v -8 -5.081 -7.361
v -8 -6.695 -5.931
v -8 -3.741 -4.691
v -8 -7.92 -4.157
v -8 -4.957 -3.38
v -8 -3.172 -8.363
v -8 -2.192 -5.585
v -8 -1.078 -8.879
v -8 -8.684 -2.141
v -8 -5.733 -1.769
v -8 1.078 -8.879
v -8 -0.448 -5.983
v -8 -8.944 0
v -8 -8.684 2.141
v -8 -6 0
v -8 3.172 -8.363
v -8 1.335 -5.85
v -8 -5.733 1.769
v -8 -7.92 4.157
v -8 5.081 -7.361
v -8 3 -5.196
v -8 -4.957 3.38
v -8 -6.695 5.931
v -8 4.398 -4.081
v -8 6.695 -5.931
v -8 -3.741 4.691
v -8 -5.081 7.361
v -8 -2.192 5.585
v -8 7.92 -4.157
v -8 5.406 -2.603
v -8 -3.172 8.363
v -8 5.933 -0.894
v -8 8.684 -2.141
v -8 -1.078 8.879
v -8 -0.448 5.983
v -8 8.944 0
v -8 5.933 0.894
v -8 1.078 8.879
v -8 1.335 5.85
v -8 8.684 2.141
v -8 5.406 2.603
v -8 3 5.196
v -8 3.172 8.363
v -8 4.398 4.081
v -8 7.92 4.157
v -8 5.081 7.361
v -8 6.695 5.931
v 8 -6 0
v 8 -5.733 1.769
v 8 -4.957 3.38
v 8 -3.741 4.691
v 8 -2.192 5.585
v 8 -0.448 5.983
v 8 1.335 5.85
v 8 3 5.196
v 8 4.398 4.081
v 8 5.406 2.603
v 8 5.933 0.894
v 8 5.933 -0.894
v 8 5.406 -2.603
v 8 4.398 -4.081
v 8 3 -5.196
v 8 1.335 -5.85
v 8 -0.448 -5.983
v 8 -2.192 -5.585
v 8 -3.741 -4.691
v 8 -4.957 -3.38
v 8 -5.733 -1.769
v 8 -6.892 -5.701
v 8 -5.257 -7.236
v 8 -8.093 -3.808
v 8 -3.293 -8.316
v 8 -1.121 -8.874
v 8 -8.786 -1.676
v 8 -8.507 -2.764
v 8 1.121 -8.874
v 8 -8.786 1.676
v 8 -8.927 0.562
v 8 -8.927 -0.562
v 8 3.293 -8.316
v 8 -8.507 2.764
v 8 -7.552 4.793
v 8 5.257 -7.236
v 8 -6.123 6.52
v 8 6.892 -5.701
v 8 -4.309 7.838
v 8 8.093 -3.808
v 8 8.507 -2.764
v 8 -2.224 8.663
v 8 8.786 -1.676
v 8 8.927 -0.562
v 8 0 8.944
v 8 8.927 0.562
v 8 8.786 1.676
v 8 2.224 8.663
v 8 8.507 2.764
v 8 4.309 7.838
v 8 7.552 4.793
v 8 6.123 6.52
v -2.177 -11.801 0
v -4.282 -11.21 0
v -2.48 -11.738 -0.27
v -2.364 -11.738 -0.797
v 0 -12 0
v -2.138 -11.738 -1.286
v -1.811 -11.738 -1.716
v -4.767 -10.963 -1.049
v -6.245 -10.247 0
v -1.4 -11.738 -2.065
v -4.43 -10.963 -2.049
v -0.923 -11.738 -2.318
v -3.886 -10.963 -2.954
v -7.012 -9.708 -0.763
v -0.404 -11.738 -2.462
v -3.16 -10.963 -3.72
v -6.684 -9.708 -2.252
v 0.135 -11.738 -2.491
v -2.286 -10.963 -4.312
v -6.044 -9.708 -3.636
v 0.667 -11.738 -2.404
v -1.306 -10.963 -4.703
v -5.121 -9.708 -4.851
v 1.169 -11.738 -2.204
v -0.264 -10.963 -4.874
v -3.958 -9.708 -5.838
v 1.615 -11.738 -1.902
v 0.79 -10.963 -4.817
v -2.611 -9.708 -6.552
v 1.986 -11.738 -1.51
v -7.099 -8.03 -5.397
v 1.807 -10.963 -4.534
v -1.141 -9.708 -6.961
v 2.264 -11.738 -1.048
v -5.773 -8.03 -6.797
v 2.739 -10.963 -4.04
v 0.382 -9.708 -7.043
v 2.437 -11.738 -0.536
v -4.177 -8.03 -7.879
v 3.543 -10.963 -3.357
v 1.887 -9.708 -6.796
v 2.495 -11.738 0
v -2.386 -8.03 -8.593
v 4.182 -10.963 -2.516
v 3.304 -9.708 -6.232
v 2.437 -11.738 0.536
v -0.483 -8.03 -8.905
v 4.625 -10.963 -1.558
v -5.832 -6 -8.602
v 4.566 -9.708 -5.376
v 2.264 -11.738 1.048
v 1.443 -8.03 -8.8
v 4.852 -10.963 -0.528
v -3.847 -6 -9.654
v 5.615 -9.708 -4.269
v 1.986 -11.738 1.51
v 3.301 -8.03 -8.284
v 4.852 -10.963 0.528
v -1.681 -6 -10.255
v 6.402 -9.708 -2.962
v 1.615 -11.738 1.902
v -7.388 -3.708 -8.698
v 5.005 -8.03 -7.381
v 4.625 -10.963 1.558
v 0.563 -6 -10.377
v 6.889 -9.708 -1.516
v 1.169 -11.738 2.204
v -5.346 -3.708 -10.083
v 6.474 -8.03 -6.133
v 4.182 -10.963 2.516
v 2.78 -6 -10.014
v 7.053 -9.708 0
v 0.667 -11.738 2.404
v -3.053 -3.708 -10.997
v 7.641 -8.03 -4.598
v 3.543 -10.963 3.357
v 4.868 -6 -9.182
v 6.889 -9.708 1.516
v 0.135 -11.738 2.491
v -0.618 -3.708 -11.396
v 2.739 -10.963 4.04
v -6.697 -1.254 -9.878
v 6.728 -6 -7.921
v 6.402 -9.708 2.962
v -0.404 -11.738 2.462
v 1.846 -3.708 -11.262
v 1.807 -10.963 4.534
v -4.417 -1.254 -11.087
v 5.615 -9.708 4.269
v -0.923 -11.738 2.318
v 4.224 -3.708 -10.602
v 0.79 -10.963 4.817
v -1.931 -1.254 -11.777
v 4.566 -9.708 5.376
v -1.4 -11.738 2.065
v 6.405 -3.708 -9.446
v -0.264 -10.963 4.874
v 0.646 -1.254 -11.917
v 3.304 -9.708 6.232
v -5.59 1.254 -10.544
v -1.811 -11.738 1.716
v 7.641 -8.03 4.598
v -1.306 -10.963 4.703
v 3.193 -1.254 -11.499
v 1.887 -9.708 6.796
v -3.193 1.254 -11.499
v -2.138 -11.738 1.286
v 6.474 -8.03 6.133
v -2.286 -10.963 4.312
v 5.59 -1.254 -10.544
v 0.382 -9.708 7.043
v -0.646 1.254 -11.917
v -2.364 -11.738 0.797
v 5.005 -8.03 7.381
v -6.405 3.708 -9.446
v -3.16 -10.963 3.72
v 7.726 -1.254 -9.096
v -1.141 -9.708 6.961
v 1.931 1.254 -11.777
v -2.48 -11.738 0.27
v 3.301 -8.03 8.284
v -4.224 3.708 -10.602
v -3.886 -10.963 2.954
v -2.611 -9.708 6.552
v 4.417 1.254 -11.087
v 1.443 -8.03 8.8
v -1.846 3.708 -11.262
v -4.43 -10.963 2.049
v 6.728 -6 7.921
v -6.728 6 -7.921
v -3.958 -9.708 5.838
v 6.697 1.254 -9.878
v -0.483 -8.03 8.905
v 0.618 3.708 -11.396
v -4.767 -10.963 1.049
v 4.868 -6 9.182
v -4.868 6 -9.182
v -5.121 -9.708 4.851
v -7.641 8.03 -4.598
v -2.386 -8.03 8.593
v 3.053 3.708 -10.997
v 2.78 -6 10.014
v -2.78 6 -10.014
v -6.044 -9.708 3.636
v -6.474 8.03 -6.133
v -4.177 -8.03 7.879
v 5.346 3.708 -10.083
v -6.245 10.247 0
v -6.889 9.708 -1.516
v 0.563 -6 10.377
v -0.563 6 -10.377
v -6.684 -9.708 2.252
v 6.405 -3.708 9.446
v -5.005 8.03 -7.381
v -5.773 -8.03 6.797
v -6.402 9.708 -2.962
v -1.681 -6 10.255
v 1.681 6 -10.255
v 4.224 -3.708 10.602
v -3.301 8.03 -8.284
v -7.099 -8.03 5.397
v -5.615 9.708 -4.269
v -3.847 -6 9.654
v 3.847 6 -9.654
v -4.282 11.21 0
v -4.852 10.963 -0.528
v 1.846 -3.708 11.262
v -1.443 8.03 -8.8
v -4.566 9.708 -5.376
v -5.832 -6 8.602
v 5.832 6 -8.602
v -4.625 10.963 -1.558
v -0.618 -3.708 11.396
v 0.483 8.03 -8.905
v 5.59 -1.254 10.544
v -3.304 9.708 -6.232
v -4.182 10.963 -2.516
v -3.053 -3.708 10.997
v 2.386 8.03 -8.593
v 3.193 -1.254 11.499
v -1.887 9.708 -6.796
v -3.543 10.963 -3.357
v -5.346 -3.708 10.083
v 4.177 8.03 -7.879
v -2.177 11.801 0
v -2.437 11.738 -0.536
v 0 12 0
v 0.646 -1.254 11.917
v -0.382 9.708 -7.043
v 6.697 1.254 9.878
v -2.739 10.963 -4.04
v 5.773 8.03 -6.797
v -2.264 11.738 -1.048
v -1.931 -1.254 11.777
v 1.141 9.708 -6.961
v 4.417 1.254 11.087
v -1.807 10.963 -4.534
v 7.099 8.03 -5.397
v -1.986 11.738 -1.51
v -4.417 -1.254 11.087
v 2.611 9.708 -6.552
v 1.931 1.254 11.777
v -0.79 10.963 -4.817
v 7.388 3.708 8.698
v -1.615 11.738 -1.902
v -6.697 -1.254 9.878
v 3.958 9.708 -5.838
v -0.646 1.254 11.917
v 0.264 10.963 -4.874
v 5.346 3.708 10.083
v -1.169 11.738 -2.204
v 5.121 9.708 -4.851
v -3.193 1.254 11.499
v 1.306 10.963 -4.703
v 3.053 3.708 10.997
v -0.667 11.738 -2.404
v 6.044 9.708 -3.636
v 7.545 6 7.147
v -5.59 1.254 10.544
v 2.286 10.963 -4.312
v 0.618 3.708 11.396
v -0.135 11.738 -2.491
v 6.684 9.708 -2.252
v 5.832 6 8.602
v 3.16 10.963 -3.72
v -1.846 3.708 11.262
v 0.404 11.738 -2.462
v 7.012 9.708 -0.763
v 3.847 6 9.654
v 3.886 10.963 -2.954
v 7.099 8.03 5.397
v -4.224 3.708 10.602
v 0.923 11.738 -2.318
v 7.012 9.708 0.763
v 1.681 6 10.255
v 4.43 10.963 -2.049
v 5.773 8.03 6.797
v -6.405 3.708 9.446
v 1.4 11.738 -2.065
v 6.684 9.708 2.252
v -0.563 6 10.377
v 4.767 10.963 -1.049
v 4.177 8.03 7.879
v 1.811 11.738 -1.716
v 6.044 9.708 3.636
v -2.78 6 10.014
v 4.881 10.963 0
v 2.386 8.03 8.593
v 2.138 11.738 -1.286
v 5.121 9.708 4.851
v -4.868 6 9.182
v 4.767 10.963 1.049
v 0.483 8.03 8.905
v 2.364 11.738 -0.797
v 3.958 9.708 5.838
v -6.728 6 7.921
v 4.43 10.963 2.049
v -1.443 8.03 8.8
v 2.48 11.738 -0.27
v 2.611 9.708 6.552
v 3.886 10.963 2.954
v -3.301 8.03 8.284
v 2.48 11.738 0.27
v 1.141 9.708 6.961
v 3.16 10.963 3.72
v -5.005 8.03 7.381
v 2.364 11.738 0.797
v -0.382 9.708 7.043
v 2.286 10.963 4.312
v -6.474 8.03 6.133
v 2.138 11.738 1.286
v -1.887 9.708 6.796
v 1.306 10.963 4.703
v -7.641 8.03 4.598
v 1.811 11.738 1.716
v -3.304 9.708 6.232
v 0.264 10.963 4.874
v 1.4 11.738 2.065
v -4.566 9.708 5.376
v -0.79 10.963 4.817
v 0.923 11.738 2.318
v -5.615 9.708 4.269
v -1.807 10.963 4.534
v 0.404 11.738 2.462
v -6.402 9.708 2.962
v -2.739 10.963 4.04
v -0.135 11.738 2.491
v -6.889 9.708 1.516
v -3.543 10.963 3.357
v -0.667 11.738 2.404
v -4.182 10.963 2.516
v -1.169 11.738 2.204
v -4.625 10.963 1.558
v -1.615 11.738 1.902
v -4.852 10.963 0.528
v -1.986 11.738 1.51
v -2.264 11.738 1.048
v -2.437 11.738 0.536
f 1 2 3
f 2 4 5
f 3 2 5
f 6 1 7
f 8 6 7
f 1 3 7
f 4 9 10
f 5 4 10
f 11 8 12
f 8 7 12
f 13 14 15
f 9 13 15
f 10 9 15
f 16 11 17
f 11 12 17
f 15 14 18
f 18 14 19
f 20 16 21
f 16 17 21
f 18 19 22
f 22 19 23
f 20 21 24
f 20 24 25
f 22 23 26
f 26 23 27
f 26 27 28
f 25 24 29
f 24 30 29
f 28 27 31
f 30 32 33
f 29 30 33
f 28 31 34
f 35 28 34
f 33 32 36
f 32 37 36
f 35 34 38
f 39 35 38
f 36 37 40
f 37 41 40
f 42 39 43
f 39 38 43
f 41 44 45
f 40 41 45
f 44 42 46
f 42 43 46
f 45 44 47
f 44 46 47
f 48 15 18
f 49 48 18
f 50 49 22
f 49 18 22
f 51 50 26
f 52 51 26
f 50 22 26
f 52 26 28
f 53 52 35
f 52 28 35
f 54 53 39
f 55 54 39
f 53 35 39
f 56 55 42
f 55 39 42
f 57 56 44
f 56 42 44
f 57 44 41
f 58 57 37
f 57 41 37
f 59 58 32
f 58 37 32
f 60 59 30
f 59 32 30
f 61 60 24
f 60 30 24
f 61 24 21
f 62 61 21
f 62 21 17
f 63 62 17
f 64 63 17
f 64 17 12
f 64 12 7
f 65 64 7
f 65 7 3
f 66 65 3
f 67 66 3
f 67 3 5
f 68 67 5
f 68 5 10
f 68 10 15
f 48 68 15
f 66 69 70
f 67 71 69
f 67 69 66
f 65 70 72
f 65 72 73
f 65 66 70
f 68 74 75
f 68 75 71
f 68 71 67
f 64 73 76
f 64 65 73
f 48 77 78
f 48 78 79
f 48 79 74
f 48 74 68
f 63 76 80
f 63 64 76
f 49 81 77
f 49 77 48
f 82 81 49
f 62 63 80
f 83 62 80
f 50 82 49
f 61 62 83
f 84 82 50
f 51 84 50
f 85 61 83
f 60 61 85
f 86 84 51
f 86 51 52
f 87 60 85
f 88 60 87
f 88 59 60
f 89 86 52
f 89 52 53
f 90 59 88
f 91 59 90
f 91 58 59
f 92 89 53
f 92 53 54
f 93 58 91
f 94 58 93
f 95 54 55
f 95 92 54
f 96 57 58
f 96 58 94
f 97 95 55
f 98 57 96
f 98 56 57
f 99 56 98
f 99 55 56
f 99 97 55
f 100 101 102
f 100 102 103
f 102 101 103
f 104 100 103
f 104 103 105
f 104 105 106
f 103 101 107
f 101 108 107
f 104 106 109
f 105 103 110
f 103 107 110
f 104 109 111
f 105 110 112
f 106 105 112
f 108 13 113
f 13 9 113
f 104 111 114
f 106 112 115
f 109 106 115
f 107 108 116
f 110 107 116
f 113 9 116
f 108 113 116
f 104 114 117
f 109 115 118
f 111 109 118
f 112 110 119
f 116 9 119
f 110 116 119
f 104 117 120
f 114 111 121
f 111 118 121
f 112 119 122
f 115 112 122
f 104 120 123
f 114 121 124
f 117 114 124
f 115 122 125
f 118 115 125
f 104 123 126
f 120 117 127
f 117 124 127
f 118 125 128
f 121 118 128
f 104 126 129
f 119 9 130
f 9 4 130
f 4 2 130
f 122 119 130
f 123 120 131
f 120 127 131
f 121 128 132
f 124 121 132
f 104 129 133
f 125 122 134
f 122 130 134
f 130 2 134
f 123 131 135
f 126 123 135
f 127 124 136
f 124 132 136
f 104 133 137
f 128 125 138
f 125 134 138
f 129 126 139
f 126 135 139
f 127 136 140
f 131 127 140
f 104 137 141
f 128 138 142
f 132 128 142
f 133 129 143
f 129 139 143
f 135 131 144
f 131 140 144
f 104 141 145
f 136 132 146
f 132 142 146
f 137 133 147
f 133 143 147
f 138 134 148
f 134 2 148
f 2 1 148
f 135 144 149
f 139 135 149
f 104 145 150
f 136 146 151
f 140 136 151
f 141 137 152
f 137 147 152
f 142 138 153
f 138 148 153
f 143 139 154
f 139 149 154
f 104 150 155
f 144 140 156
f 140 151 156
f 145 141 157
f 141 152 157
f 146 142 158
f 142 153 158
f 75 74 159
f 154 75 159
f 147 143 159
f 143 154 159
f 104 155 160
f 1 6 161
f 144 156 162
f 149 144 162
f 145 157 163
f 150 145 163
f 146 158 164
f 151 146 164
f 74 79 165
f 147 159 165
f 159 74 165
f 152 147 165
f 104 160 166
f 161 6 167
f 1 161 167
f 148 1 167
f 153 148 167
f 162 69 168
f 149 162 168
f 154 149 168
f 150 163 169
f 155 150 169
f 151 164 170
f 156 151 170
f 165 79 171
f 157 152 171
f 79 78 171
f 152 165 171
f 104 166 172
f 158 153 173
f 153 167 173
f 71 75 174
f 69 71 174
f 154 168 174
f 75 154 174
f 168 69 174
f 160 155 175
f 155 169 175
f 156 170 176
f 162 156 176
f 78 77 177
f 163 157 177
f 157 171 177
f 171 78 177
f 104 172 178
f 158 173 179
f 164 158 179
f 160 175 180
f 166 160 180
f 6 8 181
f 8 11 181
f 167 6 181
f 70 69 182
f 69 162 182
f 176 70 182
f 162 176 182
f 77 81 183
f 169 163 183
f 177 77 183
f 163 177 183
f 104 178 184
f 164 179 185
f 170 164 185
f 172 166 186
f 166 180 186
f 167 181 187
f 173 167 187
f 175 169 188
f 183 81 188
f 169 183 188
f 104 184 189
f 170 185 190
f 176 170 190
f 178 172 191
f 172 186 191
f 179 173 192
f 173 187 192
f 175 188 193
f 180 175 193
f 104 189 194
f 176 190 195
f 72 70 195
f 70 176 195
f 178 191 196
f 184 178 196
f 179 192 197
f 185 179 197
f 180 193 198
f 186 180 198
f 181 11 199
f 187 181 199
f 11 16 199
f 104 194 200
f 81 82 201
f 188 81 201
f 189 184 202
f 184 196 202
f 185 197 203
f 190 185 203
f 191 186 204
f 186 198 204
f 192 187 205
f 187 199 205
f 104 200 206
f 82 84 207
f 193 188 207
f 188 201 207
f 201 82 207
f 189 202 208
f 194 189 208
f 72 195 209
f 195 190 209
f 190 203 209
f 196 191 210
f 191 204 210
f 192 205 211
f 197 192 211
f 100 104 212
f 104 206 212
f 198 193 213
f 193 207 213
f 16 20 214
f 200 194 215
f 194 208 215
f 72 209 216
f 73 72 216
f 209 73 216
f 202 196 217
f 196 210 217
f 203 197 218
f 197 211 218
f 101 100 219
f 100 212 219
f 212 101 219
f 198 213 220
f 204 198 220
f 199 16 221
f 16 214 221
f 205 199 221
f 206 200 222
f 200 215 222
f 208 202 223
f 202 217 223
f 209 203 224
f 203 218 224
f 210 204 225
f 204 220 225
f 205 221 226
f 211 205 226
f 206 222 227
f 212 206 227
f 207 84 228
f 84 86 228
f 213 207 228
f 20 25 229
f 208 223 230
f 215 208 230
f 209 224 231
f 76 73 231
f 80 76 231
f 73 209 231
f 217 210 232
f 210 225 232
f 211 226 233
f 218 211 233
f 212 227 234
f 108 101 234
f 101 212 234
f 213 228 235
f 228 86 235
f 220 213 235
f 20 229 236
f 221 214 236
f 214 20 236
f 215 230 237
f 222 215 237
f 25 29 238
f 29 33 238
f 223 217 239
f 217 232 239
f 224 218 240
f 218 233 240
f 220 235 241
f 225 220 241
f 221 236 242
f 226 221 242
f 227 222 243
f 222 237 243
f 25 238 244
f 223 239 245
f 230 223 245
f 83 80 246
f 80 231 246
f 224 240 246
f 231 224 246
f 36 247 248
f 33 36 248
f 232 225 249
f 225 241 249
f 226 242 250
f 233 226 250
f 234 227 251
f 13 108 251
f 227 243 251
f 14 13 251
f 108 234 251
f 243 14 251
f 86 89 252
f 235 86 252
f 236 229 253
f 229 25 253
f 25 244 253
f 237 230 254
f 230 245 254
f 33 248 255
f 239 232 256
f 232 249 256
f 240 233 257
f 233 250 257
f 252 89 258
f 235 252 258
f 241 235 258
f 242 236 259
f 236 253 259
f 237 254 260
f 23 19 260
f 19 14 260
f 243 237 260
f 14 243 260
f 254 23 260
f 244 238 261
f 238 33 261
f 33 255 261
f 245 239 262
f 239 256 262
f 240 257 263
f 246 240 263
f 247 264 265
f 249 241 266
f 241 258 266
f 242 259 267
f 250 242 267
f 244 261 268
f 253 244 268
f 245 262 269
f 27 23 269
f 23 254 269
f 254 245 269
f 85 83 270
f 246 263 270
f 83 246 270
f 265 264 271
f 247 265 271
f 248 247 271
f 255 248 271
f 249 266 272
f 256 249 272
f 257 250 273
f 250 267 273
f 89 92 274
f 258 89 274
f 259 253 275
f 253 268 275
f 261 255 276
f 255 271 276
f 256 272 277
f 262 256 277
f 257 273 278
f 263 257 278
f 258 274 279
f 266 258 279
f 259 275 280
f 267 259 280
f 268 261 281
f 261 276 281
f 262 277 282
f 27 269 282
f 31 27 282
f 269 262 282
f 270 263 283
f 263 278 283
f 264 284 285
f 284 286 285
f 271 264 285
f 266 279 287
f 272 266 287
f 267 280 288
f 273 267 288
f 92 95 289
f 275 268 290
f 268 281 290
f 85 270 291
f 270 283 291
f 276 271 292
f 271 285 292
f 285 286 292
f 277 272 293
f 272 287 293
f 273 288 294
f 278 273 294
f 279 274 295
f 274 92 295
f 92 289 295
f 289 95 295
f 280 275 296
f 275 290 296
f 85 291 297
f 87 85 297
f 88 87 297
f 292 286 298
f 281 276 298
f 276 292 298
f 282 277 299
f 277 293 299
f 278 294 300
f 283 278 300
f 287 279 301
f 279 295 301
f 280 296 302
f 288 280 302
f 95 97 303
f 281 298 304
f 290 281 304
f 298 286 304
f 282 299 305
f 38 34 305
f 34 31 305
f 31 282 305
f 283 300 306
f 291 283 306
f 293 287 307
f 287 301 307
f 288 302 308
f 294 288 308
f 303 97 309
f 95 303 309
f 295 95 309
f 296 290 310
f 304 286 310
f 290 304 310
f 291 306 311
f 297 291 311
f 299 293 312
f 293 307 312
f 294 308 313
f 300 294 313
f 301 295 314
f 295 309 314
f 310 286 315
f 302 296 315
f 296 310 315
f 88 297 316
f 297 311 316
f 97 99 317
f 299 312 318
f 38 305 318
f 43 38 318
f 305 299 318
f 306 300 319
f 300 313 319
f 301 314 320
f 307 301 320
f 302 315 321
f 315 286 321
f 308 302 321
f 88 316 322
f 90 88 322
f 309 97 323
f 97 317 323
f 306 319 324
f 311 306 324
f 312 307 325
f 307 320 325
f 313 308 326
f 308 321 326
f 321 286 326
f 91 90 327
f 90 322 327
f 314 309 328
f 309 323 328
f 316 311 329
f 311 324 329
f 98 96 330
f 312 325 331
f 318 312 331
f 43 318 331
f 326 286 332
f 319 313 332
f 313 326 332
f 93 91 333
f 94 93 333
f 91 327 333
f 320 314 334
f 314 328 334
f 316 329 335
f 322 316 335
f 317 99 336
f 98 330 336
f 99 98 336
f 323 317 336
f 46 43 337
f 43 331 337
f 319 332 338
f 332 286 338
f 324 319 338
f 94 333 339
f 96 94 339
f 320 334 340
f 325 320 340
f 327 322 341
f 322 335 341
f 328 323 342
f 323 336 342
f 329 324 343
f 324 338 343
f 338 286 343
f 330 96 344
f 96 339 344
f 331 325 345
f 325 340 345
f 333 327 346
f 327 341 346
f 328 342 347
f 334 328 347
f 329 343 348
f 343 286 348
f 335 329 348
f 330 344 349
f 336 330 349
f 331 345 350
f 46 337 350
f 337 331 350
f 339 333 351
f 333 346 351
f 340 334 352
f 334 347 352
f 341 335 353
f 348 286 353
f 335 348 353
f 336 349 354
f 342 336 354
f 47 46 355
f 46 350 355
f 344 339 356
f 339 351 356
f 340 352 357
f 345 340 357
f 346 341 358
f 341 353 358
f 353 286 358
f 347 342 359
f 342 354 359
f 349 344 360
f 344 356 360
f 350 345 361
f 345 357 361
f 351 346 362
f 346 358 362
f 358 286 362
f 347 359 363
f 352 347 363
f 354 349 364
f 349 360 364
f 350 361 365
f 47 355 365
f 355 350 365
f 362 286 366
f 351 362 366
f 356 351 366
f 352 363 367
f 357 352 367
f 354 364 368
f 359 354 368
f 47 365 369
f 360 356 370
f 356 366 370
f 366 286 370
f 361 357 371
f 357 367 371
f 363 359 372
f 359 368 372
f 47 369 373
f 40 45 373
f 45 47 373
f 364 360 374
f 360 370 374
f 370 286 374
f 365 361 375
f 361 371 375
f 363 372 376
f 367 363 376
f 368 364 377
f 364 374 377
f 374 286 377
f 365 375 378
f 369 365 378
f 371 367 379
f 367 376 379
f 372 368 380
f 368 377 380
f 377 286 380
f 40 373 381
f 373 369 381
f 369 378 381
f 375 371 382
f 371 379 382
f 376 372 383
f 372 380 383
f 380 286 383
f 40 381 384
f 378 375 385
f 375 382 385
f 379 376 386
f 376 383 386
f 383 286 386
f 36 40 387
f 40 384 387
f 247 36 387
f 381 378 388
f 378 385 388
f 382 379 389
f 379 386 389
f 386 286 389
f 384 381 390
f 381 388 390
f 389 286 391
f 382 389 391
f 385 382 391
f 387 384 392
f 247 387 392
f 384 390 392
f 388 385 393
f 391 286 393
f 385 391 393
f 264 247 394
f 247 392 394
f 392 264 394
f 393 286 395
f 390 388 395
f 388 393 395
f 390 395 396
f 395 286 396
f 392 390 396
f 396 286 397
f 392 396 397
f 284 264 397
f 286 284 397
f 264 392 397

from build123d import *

# Parameters (mm, degrees)
SKETCH2_OUTSIDE_W   = 34.314
SKETCH2_OUTSIDE_H   = 34.314
SKETCH2_OUTSIDE_W_2 = 16
SKETCH2_OUTSIDE_H_2 = 32.405240589
CUT_EXTRUDE1_DEPTH  = 20
SKETCH3_R           = 6
CUT_EXTRUDE2_DEPTH  = 40


with BuildPart() as part:
    # Sketch1 → Revolve1 (revolve)
    with BuildSketch(Plane.XY):
        with BuildLine():
            Line((0, 12), (0, -12))
            ThreePointArc((0, -12), (-12, 0), (0, 12))
        make_face()
    revolve(axis=Axis((0, 16.812644527, 0), (0, -1, 0)))

    # Sketch2 outside → Cut-Extrude1 (cut, symmetric)
    with BuildSketch(Plane.XY):
        Rectangle(SKETCH2_OUTSIDE_W, SKETCH2_OUTSIDE_H)
        with Locations((0, -1.599752384)):
            Rectangle(SKETCH2_OUTSIDE_W_2, SKETCH2_OUTSIDE_H_2, mode=Mode.SUBTRACT)
    extrude(amount=CUT_EXTRUDE1_DEPTH, both=True, mode=Mode.SUBTRACT)

    # Sketch3 → Cut-Extrude2 (cut)
    with BuildSketch(Plane.ZY.offset(8)):
        with Locations(Location((0, 0, 0), (0, 0, 270))):
            Circle(SKETCH3_R)
    extrude(amount=-CUT_EXTRUDE2_DEPTH, mode=Mode.SUBTRACT)


solid = part.part
